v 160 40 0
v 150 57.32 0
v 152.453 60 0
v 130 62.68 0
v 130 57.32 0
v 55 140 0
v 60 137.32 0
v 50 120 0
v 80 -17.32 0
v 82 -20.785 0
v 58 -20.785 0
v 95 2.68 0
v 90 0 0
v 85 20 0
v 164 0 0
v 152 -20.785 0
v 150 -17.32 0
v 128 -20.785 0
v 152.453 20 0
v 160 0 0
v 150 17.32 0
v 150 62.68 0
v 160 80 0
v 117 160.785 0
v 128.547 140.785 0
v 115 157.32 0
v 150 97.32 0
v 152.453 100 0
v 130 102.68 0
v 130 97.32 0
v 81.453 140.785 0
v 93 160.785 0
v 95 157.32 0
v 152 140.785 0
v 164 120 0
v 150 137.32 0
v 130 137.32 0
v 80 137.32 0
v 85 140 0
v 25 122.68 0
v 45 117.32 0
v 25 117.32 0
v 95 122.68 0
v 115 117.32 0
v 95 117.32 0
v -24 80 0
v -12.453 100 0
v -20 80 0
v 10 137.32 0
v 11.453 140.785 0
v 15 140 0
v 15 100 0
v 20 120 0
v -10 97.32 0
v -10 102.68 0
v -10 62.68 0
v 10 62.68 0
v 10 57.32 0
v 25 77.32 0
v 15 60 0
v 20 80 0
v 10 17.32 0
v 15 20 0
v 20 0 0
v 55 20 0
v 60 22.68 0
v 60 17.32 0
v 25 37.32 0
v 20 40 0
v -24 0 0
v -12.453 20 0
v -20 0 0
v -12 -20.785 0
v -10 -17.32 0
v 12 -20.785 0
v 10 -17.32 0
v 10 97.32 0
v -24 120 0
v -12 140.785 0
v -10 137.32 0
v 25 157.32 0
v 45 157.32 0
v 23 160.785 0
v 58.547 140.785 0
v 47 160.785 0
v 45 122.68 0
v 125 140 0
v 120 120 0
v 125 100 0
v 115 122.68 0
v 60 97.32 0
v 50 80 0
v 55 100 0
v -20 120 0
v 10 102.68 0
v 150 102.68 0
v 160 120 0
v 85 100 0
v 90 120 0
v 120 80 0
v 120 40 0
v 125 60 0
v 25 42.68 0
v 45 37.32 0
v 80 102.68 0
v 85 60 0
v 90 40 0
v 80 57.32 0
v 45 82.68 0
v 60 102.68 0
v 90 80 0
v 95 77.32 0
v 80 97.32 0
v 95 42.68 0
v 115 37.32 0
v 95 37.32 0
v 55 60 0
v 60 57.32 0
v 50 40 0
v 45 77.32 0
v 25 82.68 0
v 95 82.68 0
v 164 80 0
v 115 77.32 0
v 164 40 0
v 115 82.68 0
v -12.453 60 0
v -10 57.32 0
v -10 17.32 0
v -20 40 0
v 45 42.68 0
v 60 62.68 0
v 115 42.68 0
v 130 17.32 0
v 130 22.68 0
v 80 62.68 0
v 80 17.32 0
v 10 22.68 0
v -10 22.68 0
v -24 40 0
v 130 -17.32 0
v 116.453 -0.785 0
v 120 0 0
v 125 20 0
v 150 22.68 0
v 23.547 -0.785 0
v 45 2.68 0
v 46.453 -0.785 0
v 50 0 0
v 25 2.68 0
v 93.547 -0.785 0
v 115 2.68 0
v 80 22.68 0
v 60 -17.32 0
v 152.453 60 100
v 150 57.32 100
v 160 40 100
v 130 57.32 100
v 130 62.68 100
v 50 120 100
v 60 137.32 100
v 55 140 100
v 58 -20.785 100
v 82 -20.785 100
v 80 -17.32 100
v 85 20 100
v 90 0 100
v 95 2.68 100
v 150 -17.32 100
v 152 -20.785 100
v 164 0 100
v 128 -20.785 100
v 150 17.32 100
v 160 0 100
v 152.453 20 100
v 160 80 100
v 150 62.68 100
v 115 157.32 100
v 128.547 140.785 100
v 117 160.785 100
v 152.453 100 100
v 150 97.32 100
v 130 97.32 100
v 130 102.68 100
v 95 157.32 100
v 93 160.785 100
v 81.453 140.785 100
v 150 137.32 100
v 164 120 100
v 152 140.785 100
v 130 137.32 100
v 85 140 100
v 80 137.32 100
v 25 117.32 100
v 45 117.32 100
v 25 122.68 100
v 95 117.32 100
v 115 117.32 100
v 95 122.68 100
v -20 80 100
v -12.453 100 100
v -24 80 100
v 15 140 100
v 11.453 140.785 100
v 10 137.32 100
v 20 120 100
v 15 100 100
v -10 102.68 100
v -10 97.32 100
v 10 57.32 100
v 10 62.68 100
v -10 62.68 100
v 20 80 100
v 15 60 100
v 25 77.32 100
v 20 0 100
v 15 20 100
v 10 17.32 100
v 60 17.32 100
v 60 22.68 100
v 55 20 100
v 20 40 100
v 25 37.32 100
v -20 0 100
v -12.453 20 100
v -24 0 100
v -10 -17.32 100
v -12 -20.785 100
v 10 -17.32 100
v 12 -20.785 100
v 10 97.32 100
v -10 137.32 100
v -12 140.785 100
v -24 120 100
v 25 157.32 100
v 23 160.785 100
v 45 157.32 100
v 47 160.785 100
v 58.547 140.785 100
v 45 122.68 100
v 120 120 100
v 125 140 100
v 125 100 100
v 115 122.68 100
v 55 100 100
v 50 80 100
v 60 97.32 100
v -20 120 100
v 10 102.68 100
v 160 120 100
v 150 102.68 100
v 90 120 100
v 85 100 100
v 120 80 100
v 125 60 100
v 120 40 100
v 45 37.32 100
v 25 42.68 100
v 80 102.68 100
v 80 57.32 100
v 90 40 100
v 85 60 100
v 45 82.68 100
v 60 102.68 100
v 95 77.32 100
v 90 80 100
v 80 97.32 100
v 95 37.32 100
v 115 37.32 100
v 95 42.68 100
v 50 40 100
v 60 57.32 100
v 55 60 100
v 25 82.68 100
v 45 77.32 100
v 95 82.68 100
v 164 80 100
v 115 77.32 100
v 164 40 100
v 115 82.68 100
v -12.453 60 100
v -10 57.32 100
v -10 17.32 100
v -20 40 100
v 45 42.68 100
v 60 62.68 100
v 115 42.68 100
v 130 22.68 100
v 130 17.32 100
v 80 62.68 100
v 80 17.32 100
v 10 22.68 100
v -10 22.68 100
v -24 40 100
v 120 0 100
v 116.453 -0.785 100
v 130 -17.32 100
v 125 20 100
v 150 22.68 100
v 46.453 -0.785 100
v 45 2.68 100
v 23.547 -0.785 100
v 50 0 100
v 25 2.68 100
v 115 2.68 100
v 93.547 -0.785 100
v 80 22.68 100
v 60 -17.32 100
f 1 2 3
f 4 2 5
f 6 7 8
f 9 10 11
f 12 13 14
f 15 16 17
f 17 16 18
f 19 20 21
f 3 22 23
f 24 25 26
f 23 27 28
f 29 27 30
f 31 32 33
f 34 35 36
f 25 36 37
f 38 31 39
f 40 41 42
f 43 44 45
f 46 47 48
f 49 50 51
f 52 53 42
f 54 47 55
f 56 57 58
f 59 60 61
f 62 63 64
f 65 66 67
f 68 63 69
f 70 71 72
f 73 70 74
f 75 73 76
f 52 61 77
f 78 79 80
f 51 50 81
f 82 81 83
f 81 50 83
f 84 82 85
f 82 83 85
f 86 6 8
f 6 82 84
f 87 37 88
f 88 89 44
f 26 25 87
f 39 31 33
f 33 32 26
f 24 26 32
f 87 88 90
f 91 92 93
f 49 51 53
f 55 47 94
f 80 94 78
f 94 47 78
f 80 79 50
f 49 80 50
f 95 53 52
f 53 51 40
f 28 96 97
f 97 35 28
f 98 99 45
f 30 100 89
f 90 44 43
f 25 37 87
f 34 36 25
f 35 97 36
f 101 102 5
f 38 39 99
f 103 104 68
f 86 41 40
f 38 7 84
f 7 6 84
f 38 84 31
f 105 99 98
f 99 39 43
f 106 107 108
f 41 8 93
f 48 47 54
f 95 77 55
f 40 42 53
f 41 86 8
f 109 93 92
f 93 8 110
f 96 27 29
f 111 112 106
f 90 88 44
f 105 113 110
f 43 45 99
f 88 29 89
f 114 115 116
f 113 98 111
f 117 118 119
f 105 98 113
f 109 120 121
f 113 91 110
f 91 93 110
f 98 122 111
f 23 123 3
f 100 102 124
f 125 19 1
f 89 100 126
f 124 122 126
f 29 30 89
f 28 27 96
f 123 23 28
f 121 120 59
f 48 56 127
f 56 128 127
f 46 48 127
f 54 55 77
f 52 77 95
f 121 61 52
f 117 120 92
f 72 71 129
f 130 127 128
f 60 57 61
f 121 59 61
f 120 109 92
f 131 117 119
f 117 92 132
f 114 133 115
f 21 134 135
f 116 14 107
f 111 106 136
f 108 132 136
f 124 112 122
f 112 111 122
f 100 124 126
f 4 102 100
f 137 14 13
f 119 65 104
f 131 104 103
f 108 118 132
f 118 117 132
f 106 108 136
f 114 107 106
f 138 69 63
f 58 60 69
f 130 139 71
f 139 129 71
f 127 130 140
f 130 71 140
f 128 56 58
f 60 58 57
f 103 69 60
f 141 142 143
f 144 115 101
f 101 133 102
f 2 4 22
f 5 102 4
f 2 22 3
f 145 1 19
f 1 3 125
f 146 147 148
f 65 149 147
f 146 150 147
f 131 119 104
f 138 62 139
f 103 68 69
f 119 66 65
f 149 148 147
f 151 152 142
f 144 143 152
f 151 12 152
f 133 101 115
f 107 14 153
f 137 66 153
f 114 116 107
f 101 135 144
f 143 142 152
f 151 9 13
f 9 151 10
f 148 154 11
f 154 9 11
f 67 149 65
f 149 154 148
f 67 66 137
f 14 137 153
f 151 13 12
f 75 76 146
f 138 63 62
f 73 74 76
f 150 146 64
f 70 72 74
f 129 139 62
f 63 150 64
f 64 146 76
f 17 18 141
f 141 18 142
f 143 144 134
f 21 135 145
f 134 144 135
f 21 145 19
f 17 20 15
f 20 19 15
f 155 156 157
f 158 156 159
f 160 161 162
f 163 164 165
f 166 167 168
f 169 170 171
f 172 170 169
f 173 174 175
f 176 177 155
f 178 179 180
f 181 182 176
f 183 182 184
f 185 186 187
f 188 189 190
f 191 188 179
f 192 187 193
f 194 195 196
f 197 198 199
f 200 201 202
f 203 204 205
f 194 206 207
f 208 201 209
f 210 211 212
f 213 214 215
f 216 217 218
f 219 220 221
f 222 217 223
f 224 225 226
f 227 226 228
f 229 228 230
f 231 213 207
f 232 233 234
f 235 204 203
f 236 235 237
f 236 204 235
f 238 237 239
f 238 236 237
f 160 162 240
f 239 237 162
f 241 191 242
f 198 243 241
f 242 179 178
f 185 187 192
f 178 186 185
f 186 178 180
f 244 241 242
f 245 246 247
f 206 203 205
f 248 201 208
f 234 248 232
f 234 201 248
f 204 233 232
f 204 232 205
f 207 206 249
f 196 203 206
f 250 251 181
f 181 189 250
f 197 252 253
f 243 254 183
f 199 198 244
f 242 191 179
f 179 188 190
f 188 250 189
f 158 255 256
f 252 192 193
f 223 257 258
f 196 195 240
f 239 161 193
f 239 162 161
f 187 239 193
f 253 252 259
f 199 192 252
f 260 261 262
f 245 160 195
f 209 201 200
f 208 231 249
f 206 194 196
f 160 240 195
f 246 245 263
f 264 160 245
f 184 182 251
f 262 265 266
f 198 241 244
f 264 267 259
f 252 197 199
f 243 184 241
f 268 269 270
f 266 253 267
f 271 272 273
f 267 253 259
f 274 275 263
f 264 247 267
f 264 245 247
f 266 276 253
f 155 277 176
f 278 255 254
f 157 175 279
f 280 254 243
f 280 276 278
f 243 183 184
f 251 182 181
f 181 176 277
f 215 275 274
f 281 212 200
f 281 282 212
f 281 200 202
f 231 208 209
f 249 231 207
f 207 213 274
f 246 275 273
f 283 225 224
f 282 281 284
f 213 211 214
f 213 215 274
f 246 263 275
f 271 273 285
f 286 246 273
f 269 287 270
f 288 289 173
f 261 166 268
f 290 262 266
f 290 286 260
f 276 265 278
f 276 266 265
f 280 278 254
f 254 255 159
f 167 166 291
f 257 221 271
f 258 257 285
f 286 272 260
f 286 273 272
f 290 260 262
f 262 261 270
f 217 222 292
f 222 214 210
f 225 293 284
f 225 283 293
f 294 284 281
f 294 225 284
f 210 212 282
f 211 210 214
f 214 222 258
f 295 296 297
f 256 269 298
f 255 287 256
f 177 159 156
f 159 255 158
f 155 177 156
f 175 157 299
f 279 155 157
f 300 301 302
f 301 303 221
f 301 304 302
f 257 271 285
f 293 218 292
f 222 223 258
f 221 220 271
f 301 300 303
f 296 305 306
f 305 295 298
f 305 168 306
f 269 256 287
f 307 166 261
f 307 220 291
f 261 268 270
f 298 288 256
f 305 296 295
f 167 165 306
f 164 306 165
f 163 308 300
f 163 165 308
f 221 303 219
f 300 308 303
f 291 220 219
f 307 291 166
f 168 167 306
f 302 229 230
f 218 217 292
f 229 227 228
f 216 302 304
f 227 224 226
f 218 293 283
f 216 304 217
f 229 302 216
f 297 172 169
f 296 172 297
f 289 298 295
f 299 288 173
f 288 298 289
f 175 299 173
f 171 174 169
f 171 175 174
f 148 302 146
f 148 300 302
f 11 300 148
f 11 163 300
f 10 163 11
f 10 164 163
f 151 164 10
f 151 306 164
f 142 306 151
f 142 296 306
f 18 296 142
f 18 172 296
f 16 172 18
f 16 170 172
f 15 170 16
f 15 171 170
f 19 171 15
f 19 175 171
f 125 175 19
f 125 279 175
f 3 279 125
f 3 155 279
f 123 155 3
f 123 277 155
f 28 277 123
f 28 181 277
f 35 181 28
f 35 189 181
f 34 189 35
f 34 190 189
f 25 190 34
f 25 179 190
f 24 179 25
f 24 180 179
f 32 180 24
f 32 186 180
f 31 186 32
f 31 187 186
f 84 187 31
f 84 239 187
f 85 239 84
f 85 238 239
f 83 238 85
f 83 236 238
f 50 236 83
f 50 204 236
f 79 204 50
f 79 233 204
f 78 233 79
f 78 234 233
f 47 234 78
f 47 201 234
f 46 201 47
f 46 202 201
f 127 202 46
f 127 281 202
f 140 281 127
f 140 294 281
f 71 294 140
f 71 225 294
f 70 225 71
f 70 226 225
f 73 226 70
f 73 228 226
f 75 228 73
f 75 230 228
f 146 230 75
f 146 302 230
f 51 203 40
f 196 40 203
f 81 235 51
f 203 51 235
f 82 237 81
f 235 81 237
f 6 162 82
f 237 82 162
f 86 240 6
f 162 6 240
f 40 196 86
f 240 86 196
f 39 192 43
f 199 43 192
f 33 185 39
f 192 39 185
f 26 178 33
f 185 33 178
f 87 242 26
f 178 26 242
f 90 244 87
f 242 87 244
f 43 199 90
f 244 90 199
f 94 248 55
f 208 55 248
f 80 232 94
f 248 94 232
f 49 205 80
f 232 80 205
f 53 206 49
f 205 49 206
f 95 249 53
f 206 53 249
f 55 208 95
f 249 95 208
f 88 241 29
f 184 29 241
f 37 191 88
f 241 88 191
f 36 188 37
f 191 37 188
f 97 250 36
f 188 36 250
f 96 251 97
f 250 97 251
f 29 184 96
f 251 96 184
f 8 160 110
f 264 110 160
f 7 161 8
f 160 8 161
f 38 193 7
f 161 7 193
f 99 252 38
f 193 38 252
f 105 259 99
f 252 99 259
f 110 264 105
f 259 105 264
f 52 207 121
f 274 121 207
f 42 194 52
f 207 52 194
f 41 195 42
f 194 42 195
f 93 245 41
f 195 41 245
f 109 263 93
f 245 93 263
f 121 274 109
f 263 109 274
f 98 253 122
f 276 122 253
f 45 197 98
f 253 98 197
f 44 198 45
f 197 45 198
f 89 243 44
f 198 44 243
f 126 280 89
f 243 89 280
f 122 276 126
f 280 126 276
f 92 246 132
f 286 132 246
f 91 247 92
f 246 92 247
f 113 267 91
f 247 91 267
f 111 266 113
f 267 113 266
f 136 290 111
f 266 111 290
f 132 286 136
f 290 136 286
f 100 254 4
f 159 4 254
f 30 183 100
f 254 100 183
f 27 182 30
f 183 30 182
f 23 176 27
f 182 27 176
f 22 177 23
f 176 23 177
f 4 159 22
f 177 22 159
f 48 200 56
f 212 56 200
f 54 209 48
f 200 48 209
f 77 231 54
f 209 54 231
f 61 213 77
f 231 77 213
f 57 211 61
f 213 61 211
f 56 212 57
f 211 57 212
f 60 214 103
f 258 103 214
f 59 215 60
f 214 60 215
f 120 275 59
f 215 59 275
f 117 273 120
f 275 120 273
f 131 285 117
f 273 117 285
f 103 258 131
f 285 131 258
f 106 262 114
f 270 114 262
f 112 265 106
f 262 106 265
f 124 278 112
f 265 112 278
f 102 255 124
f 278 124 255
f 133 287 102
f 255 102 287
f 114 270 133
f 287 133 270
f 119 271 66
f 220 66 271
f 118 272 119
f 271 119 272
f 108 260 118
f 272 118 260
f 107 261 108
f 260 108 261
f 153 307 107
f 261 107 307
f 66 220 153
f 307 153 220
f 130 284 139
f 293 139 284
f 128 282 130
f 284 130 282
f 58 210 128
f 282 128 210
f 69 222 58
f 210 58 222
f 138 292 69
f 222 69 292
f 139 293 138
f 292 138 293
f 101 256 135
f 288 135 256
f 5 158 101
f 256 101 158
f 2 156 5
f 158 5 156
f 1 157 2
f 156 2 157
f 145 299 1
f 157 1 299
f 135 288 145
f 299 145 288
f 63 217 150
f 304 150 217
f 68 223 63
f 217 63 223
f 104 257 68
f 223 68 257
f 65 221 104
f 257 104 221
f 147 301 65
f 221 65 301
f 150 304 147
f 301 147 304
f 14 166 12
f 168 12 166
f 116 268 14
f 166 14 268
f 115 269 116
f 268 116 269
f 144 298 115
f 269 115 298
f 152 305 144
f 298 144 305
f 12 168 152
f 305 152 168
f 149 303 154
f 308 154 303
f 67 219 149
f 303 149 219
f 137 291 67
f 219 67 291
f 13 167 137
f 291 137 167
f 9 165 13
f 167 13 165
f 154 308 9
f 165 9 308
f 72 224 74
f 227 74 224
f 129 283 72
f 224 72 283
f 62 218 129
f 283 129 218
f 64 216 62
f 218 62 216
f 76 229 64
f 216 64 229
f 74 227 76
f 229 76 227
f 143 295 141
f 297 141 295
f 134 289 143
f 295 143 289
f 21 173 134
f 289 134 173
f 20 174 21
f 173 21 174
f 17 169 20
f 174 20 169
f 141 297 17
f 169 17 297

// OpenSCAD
//cube([50,10,50]);
module hexagon(radius)
{
  circle(r=radius,$fn=6);
}
 
module shell(radius)
{
  difference()
  {
    hexagon(radius*1.2); // base
    hexagon(radius*1); // hole
  }
}
 
module piece(radius)
{
  translate([0, 0, -radius/12])
  {
    scale([1,1,0.5])
    {
      hexagon(radius);
    }
  }
}
 
module shell_with_piece(radius)
{
  shell(radius);
  piece(radius);
}
 
function column_to_offset(column, offset) = (column % 2) * offset;
 
module translate_to_hex(x_coord, y_coord, hex_width)
{
  translate([x_coord*hex_width*1.75, y_coord*hex_width*2+column_to_offset(x_coord, hex_width), 0])
  {
    child(0);
  }
}
 
module lattice(rows, columns, hex_width)
{
  for(x = [0:columns-1])
  {
    for(y = [0:rows-1])
    {
      translate_to_hex(x, y, hex_width)
      {
        shell(hex_width);
      }
    }
  }
}
 
linear_extrude(height=100)
{
  lattice(4, 5, 20);
 
  // translate_to_hex(2, 2, 4)
  // {
  //   piece(4);
  // }
}
